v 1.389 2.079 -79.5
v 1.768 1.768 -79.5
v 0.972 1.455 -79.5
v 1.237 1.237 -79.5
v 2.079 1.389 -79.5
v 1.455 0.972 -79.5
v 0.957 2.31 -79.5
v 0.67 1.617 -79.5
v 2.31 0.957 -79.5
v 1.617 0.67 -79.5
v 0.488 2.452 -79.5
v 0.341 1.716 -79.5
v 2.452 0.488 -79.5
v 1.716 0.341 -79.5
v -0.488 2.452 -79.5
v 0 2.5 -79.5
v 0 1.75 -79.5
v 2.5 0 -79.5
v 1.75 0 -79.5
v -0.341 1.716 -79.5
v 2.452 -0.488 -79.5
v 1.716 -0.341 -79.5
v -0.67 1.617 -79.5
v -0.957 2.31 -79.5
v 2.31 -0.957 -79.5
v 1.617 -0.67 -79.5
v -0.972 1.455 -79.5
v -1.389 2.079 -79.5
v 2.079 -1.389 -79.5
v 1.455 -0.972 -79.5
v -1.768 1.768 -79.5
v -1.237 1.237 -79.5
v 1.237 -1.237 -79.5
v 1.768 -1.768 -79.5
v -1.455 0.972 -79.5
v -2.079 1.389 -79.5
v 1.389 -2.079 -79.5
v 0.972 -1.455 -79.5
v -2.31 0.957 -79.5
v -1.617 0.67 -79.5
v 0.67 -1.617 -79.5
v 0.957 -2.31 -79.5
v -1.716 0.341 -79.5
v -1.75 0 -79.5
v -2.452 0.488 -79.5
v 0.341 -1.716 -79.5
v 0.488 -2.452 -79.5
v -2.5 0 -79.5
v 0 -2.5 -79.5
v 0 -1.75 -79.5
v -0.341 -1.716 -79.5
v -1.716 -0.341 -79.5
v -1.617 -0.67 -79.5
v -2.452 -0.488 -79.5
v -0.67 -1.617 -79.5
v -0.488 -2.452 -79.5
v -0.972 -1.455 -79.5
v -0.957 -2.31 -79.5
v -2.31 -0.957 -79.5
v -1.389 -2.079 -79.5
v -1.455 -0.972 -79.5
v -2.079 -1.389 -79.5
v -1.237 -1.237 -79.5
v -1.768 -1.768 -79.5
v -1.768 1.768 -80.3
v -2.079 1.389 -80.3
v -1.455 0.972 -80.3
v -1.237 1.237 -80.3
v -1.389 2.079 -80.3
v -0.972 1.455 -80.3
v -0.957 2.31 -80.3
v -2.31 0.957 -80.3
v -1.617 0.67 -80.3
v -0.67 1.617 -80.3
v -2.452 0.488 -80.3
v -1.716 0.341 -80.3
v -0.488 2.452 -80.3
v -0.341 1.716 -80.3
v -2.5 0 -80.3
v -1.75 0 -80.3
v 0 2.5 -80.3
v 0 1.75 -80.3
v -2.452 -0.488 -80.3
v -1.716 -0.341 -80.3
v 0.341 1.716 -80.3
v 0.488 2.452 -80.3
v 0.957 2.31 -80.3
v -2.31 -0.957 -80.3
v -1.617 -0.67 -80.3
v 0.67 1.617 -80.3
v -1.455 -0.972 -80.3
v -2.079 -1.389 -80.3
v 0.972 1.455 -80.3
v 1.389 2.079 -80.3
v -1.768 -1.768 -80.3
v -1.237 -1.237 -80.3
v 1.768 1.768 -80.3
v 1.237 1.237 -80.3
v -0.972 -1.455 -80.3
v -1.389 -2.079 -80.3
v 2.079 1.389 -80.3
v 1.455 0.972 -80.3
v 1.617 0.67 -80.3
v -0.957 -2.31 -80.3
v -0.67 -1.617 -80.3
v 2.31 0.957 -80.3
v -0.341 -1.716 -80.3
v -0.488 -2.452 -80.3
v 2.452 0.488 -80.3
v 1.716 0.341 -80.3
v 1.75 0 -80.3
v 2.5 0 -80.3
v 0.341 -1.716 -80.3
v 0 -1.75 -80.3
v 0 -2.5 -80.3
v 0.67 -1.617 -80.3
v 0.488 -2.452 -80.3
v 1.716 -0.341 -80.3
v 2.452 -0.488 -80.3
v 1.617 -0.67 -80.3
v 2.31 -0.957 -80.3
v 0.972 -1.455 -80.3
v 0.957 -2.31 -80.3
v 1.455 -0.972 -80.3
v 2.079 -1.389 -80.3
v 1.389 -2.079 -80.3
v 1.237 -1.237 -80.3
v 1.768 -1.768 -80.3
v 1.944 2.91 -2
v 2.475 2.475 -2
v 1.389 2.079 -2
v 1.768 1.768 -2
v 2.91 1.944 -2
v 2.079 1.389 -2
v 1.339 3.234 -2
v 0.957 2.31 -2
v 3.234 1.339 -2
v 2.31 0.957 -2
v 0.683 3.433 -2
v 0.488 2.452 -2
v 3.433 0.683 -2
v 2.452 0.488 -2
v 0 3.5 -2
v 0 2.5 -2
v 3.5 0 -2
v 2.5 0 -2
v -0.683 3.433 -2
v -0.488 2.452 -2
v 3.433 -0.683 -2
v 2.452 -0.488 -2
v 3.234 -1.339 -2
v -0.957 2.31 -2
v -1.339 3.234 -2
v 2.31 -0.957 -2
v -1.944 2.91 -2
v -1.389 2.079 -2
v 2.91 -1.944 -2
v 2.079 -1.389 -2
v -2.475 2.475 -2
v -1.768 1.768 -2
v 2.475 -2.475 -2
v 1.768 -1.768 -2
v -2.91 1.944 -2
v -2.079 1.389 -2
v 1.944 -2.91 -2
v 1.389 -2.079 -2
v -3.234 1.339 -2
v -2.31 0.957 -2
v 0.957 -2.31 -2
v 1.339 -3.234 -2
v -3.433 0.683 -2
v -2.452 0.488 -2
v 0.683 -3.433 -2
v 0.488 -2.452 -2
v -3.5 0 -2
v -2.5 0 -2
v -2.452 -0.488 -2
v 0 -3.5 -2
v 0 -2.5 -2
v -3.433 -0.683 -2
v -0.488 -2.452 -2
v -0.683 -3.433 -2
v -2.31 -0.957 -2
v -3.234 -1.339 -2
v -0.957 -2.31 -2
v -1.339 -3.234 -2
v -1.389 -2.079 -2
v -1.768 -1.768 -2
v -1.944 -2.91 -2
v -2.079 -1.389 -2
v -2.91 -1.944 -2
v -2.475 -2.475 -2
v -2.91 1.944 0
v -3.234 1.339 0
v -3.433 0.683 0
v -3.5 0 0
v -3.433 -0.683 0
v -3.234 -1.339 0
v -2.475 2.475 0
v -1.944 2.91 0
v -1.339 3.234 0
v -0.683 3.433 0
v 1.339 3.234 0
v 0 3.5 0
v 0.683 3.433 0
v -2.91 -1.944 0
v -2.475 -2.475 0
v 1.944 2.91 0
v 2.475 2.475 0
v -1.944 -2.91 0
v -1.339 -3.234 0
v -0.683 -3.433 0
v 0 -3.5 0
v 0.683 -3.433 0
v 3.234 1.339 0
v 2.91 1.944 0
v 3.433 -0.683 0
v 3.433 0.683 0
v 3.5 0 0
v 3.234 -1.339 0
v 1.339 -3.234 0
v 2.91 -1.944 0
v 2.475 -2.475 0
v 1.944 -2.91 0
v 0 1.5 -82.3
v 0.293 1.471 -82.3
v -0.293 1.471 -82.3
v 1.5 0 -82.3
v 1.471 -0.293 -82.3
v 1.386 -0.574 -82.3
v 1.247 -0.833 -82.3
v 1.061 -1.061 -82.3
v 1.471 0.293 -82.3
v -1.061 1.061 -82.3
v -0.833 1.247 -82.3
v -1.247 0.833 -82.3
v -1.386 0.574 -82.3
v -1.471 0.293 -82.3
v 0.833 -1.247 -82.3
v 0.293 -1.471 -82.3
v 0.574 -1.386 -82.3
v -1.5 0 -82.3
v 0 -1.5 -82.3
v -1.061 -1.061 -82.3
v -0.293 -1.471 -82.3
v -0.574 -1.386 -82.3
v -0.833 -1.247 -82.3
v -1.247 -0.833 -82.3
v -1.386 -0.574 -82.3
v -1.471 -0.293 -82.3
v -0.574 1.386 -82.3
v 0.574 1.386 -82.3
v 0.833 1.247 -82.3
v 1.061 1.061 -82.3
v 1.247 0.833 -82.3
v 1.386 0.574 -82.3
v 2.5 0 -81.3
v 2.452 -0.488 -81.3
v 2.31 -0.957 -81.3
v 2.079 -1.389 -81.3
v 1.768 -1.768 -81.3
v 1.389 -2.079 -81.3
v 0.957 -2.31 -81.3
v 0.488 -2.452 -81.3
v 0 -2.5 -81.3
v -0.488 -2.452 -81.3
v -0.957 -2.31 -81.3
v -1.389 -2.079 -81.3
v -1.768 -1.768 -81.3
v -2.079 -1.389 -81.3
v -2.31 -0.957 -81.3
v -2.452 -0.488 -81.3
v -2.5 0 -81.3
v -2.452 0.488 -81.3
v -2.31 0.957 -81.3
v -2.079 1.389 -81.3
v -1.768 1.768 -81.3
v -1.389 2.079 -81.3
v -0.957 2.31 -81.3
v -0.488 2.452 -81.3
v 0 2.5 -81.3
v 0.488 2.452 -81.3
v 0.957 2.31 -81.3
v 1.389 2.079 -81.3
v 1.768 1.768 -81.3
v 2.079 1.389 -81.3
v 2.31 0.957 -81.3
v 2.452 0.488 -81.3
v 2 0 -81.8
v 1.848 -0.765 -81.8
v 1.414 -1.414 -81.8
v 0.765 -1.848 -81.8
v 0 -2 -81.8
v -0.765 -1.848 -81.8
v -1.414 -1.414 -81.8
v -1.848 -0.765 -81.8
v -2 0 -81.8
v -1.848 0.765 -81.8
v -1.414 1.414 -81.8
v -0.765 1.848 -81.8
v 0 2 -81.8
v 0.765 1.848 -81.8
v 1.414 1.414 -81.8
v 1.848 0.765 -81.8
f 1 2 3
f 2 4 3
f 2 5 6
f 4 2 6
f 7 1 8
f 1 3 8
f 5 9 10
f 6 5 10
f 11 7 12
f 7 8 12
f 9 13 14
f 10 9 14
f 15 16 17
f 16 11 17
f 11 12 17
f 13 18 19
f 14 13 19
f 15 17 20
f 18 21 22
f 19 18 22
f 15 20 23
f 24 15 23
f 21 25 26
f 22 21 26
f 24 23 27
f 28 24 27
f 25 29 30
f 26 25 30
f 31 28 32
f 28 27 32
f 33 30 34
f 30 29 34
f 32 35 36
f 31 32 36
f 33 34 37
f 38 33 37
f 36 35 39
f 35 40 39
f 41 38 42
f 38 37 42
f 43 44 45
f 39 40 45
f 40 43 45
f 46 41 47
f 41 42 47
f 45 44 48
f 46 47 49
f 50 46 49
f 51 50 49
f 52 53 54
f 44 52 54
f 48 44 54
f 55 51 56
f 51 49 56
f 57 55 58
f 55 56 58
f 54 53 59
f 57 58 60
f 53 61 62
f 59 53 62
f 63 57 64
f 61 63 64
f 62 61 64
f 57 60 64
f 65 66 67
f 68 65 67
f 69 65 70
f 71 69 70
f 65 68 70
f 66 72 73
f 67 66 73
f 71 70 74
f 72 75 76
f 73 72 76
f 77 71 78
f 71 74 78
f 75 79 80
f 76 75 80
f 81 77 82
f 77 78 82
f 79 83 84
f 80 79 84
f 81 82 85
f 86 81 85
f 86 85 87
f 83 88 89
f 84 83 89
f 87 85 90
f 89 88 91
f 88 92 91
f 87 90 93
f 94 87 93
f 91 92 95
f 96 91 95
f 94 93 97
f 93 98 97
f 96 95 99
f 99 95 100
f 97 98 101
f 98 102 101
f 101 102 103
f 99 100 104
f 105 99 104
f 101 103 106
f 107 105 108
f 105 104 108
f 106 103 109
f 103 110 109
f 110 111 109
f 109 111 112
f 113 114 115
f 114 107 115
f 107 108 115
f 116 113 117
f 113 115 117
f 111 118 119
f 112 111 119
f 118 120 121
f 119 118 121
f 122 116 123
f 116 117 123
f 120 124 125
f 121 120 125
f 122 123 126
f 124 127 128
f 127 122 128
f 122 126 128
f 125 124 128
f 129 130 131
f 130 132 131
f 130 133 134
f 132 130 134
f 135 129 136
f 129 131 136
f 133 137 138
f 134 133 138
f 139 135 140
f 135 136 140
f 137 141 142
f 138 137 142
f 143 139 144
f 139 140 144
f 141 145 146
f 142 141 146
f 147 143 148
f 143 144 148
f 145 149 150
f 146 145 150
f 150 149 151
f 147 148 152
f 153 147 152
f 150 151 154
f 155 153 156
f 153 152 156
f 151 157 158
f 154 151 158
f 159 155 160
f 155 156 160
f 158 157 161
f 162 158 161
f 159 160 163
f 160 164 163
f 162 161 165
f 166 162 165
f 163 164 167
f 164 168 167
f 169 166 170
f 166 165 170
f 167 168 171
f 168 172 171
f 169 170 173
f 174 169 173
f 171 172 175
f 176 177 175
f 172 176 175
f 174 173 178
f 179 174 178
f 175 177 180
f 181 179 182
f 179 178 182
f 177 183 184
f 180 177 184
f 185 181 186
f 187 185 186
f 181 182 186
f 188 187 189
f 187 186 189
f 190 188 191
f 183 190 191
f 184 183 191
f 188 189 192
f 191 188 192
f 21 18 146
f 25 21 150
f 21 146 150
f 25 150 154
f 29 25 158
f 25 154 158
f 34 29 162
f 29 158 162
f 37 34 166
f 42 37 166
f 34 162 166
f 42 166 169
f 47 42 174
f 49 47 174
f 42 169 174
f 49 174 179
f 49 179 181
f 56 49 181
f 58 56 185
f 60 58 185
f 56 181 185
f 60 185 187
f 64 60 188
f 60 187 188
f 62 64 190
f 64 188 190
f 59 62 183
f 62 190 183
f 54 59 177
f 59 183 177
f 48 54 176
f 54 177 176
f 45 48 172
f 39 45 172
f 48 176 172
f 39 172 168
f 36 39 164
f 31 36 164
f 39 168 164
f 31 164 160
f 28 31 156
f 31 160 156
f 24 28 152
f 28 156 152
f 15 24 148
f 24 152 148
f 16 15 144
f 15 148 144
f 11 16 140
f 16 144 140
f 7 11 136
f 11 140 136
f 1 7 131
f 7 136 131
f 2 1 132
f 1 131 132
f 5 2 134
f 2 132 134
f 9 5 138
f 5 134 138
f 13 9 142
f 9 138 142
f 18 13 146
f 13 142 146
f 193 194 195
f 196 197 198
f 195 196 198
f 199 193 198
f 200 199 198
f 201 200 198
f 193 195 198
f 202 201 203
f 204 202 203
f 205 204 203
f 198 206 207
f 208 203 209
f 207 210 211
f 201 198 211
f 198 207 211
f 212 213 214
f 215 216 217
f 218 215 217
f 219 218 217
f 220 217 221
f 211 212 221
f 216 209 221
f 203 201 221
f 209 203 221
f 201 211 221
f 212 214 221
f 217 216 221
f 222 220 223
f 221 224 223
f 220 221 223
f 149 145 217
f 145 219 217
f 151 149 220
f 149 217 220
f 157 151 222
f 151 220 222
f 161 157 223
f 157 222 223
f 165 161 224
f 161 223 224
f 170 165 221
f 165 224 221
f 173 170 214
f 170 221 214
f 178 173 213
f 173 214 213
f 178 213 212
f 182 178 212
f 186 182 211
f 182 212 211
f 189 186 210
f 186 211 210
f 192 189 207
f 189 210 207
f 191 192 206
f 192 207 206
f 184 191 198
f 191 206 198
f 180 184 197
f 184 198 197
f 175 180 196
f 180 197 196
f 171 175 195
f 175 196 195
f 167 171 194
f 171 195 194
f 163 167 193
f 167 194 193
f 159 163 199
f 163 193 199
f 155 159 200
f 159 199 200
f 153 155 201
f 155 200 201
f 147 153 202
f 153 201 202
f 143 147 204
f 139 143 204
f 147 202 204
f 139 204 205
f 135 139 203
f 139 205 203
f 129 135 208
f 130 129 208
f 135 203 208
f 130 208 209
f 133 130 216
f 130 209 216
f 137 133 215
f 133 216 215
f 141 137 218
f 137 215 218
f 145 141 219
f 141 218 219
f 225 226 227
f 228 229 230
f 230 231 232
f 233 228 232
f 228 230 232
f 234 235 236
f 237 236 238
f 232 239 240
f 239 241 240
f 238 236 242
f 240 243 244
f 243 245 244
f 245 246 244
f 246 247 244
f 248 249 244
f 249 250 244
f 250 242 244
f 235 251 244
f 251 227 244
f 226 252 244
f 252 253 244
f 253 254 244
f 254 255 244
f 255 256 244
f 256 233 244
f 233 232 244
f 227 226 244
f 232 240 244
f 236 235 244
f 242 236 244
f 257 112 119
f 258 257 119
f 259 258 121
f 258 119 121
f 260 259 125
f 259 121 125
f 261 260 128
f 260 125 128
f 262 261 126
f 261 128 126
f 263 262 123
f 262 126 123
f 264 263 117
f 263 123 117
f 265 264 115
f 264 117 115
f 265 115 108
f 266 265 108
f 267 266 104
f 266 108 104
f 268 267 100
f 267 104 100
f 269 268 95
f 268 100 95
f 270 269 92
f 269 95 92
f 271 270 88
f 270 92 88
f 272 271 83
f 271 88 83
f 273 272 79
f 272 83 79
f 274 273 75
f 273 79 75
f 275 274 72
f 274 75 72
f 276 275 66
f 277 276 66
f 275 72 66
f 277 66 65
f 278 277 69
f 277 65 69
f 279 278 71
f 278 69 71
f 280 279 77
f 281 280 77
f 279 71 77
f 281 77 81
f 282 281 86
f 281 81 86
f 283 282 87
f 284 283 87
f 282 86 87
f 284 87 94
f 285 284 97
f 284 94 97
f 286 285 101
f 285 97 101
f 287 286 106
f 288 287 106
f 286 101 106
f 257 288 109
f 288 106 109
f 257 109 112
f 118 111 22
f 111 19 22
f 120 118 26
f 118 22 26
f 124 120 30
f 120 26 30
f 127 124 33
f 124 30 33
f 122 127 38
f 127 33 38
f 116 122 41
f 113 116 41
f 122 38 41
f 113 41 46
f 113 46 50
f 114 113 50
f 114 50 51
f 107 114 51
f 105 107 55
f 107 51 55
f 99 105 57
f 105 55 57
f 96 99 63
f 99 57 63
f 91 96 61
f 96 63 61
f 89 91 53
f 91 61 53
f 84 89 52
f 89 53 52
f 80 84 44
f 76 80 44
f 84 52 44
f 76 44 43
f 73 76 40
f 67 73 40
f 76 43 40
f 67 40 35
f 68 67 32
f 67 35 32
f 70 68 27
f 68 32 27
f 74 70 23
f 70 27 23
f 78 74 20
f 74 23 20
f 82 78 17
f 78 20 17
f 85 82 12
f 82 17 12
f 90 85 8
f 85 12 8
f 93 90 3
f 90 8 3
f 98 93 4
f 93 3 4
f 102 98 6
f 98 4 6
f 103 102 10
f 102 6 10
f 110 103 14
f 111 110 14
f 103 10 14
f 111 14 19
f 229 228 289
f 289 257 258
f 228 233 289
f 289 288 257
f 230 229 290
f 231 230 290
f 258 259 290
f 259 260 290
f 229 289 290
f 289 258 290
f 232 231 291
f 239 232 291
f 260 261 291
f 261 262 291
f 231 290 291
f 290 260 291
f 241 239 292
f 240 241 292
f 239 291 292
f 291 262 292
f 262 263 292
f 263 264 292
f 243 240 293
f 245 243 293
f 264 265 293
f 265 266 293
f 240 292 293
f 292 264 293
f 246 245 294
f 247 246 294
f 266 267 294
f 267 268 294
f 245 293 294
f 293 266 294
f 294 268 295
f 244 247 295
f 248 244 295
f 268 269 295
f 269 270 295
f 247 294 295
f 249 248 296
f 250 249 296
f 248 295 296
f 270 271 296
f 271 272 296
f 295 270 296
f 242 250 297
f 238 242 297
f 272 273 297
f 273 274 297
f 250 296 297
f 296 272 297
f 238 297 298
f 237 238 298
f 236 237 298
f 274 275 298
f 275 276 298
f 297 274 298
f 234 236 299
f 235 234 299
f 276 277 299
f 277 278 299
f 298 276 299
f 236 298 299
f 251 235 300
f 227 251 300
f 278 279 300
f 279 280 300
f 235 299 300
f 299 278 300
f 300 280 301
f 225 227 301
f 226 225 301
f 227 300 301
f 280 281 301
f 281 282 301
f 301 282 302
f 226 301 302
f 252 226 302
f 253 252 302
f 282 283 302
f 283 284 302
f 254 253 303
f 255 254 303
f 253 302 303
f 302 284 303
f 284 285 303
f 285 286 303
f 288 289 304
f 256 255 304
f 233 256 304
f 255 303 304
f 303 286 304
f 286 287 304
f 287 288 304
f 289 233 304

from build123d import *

# Parameters (mm, degrees)
CHAMFER_1_SIZE = 1


with BuildPart() as part:
    # 草图1 → 旋转1 (revolve)
    with BuildSketch(Plane(origin=(0, 0, 0), x_dir=(0, 0, -1), z_dir=(1, 0, 0)), mode=Mode.PRIVATE) as revolve_1_sk:
        Polygon((79.5, 2.5), (2, 2.5), (2, 3.5), (0, 3.5), (0, 0), (82.3, 0), (82.3, 2.5), (80.3, 2.5), (80.3, 1.75), (79.5, 1.75), align=None)
    revolve(revolve_1_sk.sketch.rotate(Axis((0, 0, 0), (0, 0, -1)), 90), axis=Axis((0, 0, 0), (0, 0, -1)))

    # 倒角1
    chamfer_1_edges = [part.edges().sort_by_distance(p)[0] for p in [
        (-2.5, 0, -82.3),
    ]]
    chamfer(chamfer_1_edges, length=CHAMFER_1_SIZE)


solid = part.part
